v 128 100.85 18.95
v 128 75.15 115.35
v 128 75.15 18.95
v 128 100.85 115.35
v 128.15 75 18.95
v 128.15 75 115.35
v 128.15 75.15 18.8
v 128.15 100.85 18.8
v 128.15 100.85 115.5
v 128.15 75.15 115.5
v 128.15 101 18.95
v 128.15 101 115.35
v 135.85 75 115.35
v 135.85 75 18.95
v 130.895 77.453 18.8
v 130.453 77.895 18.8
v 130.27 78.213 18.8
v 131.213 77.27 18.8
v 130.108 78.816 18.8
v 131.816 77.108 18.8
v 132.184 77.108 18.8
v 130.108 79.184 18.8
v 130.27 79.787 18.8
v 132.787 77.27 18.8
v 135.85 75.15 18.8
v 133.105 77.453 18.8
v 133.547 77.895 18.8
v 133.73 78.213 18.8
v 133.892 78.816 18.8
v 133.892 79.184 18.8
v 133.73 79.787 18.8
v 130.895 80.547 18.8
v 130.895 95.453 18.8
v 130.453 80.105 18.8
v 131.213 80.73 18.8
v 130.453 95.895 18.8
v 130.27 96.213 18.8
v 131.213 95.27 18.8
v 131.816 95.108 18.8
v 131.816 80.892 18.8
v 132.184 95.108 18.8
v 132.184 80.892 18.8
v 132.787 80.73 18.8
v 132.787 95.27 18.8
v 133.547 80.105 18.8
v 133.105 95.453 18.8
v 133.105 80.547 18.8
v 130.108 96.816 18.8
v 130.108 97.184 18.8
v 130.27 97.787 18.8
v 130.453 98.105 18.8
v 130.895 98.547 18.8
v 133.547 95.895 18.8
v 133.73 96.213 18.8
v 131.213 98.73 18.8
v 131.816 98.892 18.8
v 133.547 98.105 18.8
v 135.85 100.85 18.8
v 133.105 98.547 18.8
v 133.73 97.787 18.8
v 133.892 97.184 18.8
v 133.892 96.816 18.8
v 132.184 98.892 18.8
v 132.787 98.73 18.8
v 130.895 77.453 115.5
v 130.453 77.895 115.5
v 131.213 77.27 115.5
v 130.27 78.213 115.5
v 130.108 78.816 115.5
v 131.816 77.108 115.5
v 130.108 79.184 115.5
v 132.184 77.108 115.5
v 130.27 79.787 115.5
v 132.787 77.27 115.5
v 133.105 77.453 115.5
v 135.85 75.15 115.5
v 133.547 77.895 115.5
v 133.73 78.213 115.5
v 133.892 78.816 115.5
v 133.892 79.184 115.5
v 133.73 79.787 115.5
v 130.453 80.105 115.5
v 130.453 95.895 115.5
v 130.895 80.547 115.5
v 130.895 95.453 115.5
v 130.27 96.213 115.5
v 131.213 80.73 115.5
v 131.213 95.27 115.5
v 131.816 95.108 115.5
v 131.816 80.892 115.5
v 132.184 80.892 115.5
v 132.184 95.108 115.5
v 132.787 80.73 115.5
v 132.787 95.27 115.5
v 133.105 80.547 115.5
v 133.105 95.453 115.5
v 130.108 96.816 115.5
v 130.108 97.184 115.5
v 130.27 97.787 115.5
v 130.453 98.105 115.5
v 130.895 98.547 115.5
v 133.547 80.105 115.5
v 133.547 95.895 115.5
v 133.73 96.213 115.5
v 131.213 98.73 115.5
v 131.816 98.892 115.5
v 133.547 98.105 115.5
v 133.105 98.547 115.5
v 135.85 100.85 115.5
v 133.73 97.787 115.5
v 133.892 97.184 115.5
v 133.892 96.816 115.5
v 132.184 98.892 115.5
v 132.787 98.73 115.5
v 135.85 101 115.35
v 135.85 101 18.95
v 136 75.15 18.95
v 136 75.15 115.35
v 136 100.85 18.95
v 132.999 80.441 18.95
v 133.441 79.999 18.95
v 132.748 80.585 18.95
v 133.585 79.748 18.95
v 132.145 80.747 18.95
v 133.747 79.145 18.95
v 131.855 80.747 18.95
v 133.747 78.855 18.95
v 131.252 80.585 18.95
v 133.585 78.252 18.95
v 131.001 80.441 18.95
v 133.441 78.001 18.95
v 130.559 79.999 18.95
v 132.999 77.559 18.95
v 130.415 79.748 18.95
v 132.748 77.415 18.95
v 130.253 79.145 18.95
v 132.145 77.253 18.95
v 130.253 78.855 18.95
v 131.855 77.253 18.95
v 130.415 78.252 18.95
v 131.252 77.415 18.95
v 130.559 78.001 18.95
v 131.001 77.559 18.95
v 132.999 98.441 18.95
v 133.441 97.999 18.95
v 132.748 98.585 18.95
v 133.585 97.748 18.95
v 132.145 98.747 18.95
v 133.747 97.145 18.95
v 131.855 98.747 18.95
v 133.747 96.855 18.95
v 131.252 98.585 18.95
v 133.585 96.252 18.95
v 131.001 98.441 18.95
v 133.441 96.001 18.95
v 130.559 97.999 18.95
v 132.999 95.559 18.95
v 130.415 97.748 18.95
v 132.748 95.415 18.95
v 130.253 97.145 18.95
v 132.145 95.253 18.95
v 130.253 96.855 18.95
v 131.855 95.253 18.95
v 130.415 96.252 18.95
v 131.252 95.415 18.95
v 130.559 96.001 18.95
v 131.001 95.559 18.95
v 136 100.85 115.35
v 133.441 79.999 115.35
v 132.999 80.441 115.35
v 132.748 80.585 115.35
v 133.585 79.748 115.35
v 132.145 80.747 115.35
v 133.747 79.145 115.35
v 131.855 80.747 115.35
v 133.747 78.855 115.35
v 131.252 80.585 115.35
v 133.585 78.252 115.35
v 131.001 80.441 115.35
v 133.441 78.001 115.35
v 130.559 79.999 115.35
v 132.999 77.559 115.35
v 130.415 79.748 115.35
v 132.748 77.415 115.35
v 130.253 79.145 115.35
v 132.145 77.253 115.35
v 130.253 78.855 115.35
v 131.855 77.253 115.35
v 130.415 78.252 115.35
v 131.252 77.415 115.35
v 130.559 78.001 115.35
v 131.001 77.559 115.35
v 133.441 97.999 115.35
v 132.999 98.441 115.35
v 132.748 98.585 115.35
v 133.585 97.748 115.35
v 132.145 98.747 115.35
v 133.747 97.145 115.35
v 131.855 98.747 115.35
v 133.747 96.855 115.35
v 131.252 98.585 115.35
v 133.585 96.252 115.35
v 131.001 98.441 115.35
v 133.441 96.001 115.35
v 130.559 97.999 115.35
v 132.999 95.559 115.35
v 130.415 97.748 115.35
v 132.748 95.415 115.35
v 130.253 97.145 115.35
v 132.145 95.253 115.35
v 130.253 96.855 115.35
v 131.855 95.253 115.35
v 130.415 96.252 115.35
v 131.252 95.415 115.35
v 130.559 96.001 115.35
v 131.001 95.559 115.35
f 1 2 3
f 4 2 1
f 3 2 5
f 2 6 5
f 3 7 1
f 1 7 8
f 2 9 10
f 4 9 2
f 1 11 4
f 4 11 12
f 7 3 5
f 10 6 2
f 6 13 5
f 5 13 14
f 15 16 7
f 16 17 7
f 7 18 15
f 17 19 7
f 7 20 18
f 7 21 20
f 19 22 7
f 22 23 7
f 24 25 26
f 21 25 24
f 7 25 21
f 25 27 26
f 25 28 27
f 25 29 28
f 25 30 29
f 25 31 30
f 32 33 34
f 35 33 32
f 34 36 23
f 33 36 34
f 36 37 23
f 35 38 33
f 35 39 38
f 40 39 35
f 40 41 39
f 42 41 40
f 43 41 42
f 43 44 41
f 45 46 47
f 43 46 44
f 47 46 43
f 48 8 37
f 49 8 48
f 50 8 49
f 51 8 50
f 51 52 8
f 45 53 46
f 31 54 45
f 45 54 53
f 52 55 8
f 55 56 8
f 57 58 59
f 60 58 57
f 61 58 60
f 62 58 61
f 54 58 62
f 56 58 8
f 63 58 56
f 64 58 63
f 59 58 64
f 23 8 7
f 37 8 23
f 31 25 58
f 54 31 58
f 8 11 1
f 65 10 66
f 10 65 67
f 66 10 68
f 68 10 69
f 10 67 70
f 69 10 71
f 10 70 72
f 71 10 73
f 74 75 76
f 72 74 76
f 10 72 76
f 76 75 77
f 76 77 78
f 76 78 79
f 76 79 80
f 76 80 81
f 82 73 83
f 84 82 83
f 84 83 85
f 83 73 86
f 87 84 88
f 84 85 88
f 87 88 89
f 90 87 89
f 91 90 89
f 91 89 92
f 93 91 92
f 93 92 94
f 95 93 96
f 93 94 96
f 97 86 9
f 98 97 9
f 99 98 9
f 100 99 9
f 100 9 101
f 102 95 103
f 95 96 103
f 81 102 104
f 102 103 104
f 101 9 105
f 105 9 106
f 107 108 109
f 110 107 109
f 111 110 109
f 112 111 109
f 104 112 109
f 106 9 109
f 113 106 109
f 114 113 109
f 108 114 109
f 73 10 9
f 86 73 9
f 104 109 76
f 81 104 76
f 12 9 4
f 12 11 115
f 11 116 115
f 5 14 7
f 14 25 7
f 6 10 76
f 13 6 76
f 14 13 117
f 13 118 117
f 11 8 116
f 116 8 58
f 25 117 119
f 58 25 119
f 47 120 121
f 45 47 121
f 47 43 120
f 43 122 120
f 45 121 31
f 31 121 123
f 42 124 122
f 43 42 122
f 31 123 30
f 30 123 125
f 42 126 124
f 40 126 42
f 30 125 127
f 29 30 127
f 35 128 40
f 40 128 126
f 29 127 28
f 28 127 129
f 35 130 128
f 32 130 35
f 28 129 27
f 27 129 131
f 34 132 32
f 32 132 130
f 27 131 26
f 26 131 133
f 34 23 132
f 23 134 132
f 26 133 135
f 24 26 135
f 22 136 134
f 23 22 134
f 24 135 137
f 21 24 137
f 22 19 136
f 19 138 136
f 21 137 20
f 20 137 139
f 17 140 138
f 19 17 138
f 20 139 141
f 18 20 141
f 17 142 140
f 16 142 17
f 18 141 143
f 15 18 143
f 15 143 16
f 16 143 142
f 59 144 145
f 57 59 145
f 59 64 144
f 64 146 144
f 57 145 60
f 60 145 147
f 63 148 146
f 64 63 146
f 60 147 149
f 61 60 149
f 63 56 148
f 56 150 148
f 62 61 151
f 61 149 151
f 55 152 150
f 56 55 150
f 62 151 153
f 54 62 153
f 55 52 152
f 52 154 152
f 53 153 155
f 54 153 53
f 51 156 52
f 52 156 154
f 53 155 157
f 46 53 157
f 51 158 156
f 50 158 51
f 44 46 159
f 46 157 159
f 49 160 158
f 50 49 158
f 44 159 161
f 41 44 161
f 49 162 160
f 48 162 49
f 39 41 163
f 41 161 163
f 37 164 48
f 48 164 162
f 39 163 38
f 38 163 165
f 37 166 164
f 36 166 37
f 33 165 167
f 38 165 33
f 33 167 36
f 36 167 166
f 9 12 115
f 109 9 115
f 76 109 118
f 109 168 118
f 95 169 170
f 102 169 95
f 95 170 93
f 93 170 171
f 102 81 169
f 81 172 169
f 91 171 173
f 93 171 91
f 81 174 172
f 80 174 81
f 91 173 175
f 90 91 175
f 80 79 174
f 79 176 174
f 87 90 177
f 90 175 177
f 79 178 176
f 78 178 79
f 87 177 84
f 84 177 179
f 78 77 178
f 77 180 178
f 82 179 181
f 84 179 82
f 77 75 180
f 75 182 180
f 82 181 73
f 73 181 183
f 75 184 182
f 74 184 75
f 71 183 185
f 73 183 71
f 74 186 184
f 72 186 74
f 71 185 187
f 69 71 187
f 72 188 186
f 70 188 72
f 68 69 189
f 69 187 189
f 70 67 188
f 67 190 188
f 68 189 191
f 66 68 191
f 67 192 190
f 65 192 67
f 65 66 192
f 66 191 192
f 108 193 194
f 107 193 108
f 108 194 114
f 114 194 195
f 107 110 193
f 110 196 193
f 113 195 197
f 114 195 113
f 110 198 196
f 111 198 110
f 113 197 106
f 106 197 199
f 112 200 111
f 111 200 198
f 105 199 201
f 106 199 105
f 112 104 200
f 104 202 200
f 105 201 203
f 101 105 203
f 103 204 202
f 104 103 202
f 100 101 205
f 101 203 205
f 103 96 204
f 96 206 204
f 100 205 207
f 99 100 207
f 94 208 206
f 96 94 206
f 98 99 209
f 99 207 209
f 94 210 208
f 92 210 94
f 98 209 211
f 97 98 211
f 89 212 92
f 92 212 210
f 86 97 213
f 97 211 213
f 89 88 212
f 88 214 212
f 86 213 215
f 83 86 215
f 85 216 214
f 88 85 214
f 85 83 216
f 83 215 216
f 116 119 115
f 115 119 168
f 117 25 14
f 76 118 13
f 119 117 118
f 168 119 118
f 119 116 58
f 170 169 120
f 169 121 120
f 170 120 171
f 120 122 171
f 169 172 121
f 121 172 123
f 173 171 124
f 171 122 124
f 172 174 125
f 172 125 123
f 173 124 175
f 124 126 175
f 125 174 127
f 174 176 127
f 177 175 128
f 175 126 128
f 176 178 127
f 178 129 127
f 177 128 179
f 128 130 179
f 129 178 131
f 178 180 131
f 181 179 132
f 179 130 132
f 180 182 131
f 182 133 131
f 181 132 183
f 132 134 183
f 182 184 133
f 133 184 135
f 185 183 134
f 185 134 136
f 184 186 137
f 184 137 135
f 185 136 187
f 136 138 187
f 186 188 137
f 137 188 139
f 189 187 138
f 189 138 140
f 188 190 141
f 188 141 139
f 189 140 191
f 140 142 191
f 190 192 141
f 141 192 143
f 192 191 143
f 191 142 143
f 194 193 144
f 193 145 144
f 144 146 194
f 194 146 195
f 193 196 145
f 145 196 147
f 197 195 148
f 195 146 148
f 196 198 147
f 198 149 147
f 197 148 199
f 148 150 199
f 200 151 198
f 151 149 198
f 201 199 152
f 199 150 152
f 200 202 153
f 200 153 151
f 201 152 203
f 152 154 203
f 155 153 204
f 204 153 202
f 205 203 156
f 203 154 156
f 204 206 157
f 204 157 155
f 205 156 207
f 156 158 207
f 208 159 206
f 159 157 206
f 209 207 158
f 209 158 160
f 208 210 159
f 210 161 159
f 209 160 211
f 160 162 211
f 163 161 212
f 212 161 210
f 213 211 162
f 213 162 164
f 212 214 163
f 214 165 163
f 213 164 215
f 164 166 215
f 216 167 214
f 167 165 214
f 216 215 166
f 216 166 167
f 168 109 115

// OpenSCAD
// Generated from the same CSG operations as STEP. Rebuild with spec/build_parent_hand_service.py.
polyhedron(points=[[128.0, 75.1500015258789, 18.950000762939453], [128.0, 75.1500015258789, 115.3499984741211], [128.0, 100.8499984741211, 18.950000762939453], [128.0, 100.8499984741211, 115.3499984741211], [128.14999389648438, 75.0, 18.950000762939453], [128.14999389648438, 75.0, 115.3499984741211], [128.14999389648438, 75.1500015258789, 18.799999237060547], [128.14999389648438, 100.8499984741211, 18.799999237060547], [128.14999389648438, 75.1500015258789, 115.5], [128.14999389648438, 100.8499984741211, 115.5], [128.14999389648438, 101.0, 18.950000762939453], [128.14999389648438, 101.0, 115.3499984741211], [135.85000610351562, 75.0, 115.3499984741211], [135.85000610351562, 75.0, 18.950000762939453], [130.4534149169922, 77.89494323730469, 18.799999237060547], [130.8949432373047, 77.45340728759766, 18.799999237060547], [130.2696990966797, 78.21314239501953, 18.799999237060547], [131.213134765625, 77.26969909667969, 18.799999237060547], [130.1080780029297, 78.81629180908203, 18.799999237060547], [131.8162841796875, 77.10808563232422, 18.799999237060547], [132.1837158203125, 77.10808563232422, 18.799999237060547], [130.1080780029297, 79.18370819091797, 18.799999237060547], [130.2696990966797, 79.78685760498047, 18.799999237060547], [133.1050567626953, 77.45340728759766, 18.799999237060547], [135.85000610351562, 75.1500015258789, 18.799999237060547], [132.786865234375, 77.26969909667969, 18.799999237060547], [133.5465850830078, 77.89494323730469, 18.799999237060547], [133.7303009033203, 78.21314239501953, 18.799999237060547], [133.8919219970703, 78.81629180908203, 18.799999237060547], [133.8919219970703, 79.18370819091797, 18.799999237060547], [133.7303009033203, 79.78685760498047, 18.799999237060547], [130.4534149169922, 80.10505676269531, 18.799999237060547], [130.8949432373047, 95.45340728759766, 18.799999237060547], [130.8949432373047, 80.54659271240234, 18.799999237060547], [131.213134765625, 80.73030090332031, 18.799999237060547], [130.4534149169922, 95.89494323730469, 18.799999237060547], [130.2696990966797, 96.21314239501953, 18.799999237060547], [131.213134765625, 95.26969909667969, 18.799999237060547], [131.8162841796875, 95.10808563232422, 18.799999237060547], [131.8162841796875, 80.89191436767578, 18.799999237060547], [132.1837158203125, 95.10808563232422, 18.799999237060547], [132.1837158203125, 80.89191436767578, 18.799999237060547], [132.786865234375, 80.73030090332031, 18.799999237060547], [132.786865234375, 95.26969909667969, 18.799999237060547], [133.1050567626953, 80.54659271240234, 18.799999237060547], [133.1050567626953, 95.45340728759766, 18.799999237060547], [133.5465850830078, 80.10505676269531, 18.799999237060547], [130.1080780029297, 96.81629180908203, 18.799999237060547], [130.1080780029297, 97.18370819091797, 18.799999237060547], [130.2696990966797, 97.78685760498047, 18.799999237060547], [130.4534149169922, 98.10505676269531, 18.799999237060547], [130.8949432373047, 98.54659271240234, 18.799999237060547], [133.5465850830078, 95.89494323730469, 18.799999237060547], [133.7303009033203, 96.21314239501953, 18.799999237060547], [131.213134765625, 98.73030090332031, 18.799999237060547], [131.8162841796875, 98.89191436767578, 18.799999237060547], [133.1050567626953, 98.54659271240234, 18.799999237060547], [135.85000610351562, 100.8499984741211, 18.799999237060547], [133.5465850830078, 98.10505676269531, 18.799999237060547], [133.7303009033203, 97.78685760498047, 18.799999237060547], [133.8919219970703, 97.18370819091797, 18.799999237060547], [133.8919219970703, 96.81629180908203, 18.799999237060547], [132.1837158203125, 98.89191436767578, 18.799999237060547], [132.786865234375, 98.73030090332031, 18.799999237060547], [130.4534149169922, 77.89494323730469, 115.5], [130.8949432373047, 77.45340728759766, 115.5], [131.213134765625, 77.26969909667969, 115.5], [130.2696990966797, 78.21314239501953, 115.5], [130.1080780029297, 78.81629180908203, 115.5], [131.8162841796875, 77.10808563232422, 115.5], [130.1080780029297, 79.18370819091797, 115.5], [132.1837158203125, 77.10808563232422, 115.5], [130.2696990966797, 79.78685760498047, 115.5], [135.85000610351562, 75.1500015258789, 115.5], [133.1050567626953, 77.45340728759766, 115.5], [132.786865234375, 77.26969909667969, 115.5], [133.5465850830078, 77.89494323730469, 115.5], [133.7303009033203, 78.21314239501953, 115.5], [133.8919219970703, 78.81629180908203, 115.5], [133.8919219970703, 79.18370819091797, 115.5], [133.7303009033203, 79.78685760498047, 115.5], [130.4534149169922, 95.89494323730469, 115.5], [130.4534149169922, 80.10505676269531, 115.5], [130.8949432373047, 80.54659271240234, 115.5], [130.8949432373047, 95.45340728759766, 115.5], [130.2696990966797, 96.21314239501953, 115.5], [131.213134765625, 95.26969909667969, 115.5], [131.213134765625, 80.73030090332031, 115.5], [131.8162841796875, 95.10808563232422, 115.5], [131.8162841796875, 80.89191436767578, 115.5], [132.1837158203125, 80.89191436767578, 115.5], [132.1837158203125, 95.10808563232422, 115.5], [132.786865234375, 80.73030090332031, 115.5], [132.786865234375, 95.26969909667969, 115.5], [133.1050567626953, 95.45340728759766, 115.5], [133.1050567626953, 80.54659271240234, 115.5], [130.1080780029297, 96.81629180908203, 115.5], [130.1080780029297, 97.18370819091797, 115.5], [130.2696990966797, 97.78685760498047, 115.5], [130.4534149169922, 98.10505676269531, 115.5], [130.8949432373047, 98.54659271240234, 115.5], [133.5465850830078, 95.89494323730469, 115.5], [133.5465850830078, 80.10505676269531, 115.5], [133.7303009033203, 96.21314239501953, 115.5], [131.213134765625, 98.73030090332031, 115.5], [131.8162841796875, 98.89191436767578, 115.5], [135.85000610351562, 100.8499984741211, 115.5], [133.1050567626953, 98.54659271240234, 115.5], [133.5465850830078, 98.10505676269531, 115.5], [133.7303009033203, 97.78685760498047, 115.5], [133.8919219970703, 97.18370819091797, 115.5], [133.8919219970703, 96.81629180908203, 115.5], [132.1837158203125, 98.89191436767578, 115.5], [132.786865234375, 98.73030090332031, 115.5], [135.85000610351562, 101.0, 115.3499984741211], [135.85000610351562, 101.0, 18.950000762939453], [136.0, 75.1500015258789, 18.950000762939453], [136.0, 75.1500015258789, 115.3499984741211], [136.0, 100.8499984741211, 18.950000762939453], [133.44052124023438, 79.99899291992188, 18.950000762939453], [132.99899291992188, 80.4405288696289, 18.950000762939453], [132.74803161621094, 80.58541870117188, 18.950000762939453], [133.58541870117188, 79.74803924560547, 18.950000762939453], [132.14488220214844, 80.74703216552734, 18.950000762939453], [133.7470245361328, 79.14488983154297, 18.950000762939453], [131.85511779785156, 80.74703216552734, 18.950000762939453], [133.7470245361328, 78.85511016845703, 18.950000762939453], [131.25196838378906, 80.58541870117188, 18.950000762939453], [133.58541870117188, 78.25196075439453, 18.950000762939453], [131.00100708007812, 80.4405288696289, 18.950000762939453], [133.44052124023438, 78.00100708007812, 18.950000762939453], [130.55947875976562, 79.99899291992188, 18.950000762939453], [132.99899291992188, 77.5594711303711, 18.950000762939453], [130.41458129882812, 79.74803924560547, 18.950000762939453], [132.74803161621094, 77.41458129882812, 18.950000762939453], [130.2529754638672, 79.14488983154297, 18.950000762939453], [132.14488220214844, 77.25296783447266, 18.950000762939453], [130.2529754638672, 78.85511016845703, 18.950000762939453], [131.85511779785156, 77.25296783447266, 18.950000762939453], [130.41458129882812, 78.25196075439453, 18.950000762939453], [131.25196838378906, 77.41458129882812, 18.950000762939453], [130.55947875976562, 78.00100708007812, 18.950000762939453], [131.00100708007812, 77.5594711303711, 18.950000762939453], [133.44052124023438, 97.99899291992188, 18.950000762939453], [132.99899291992188, 98.4405288696289, 18.950000762939453], [132.74803161621094, 98.58541870117188, 18.950000762939453], [133.58541870117188, 97.74803924560547, 18.950000762939453], [132.14488220214844, 98.74703216552734, 18.950000762939453], [133.7470245361328, 97.14488983154297, 18.950000762939453], [131.85511779785156, 98.74703216552734, 18.950000762939453], [133.7470245361328, 96.85511016845703, 18.950000762939453], [131.25196838378906, 98.58541870117188, 18.950000762939453], [133.58541870117188, 96.25196075439453, 18.950000762939453], [131.00100708007812, 98.4405288696289, 18.950000762939453], [133.44052124023438, 96.00100708007812, 18.950000762939453], [130.55947875976562, 97.99899291992188, 18.950000762939453], [132.99899291992188, 95.5594711303711, 18.950000762939453], [130.41458129882812, 97.74803924560547, 18.950000762939453], [132.74803161621094, 95.41458129882812, 18.950000762939453], [130.2529754638672, 97.14488983154297, 18.950000762939453], [132.14488220214844, 95.25296783447266, 18.950000762939453], [130.2529754638672, 96.85511016845703, 18.950000762939453], [131.85511779785156, 95.25296783447266, 18.950000762939453], [130.41458129882812, 96.25196075439453, 18.950000762939453], [131.25196838378906, 95.41458129882812, 18.950000762939453], [130.55947875976562, 96.00100708007812, 18.950000762939453], [131.00100708007812, 95.5594711303711, 18.950000762939453], [136.0, 100.8499984741211, 115.3499984741211], [132.99899291992188, 80.4405288696289, 115.3499984741211], [133.44052124023438, 79.99899291992188, 115.3499984741211], [132.74803161621094, 80.58541870117188, 115.3499984741211], [133.58541870117188, 79.74803924560547, 115.3499984741211], [132.14488220214844, 80.74703216552734, 115.3499984741211], [133.7470245361328, 79.14488983154297, 115.3499984741211], [131.85511779785156, 80.74703216552734, 115.3499984741211], [133.7470245361328, 78.85511016845703, 115.3499984741211], [131.25196838378906, 80.58541870117188, 115.3499984741211], [133.58541870117188, 78.25196075439453, 115.3499984741211], [131.00100708007812, 80.4405288696289, 115.3499984741211], [133.44052124023438, 78.00100708007812, 115.3499984741211], [130.55947875976562, 79.99899291992188, 115.3499984741211], [132.99899291992188, 77.5594711303711, 115.3499984741211], [130.41458129882812, 79.74803924560547, 115.3499984741211], [132.74803161621094, 77.41458129882812, 115.3499984741211], [130.2529754638672, 79.14488983154297, 115.3499984741211], [132.14488220214844, 77.25296783447266, 115.3499984741211], [130.2529754638672, 78.85511016845703, 115.3499984741211], [131.85511779785156, 77.25296783447266, 115.3499984741211], [130.41458129882812, 78.25196075439453, 115.3499984741211], [131.25196838378906, 77.41458129882812, 115.3499984741211], [130.55947875976562, 78.00100708007812, 115.3499984741211], [131.00100708007812, 77.5594711303711, 115.3499984741211], [132.99899291992188, 98.4405288696289, 115.3499984741211], [133.44052124023438, 97.99899291992188, 115.3499984741211], [132.74803161621094, 98.58541870117188, 115.3499984741211], [133.58541870117188, 97.74803924560547, 115.3499984741211], [132.14488220214844, 98.74703216552734, 115.3499984741211], [133.7470245361328, 97.14488983154297, 115.3499984741211], [131.85511779785156, 98.74703216552734, 115.3499984741211], [133.7470245361328, 96.85511016845703, 115.3499984741211], [131.25196838378906, 98.58541870117188, 115.3499984741211], [133.58541870117188, 96.25196075439453, 115.3499984741211], [131.00100708007812, 98.4405288696289, 115.3499984741211], [133.44052124023438, 96.00100708007812, 115.3499984741211], [130.55947875976562, 97.99899291992188, 115.3499984741211], [132.99899291992188, 95.5594711303711, 115.3499984741211], [130.41458129882812, 97.74803924560547, 115.3499984741211], [132.74803161621094, 95.41458129882812, 115.3499984741211], [130.2529754638672, 97.14488983154297, 115.3499984741211], [132.14488220214844, 95.25296783447266, 115.3499984741211], [130.2529754638672, 96.85511016845703, 115.3499984741211], [131.85511779785156, 95.25296783447266, 115.3499984741211], [130.41458129882812, 96.25196075439453, 115.3499984741211], [131.25196838378906, 95.41458129882812, 115.3499984741211], [130.55947875976562, 96.00100708007812, 115.3499984741211], [131.00100708007812, 95.5594711303711, 115.3499984741211]],faces=[[0, 1, 2], [2, 1, 3], [4, 1, 0], [4, 5, 1], [2, 6, 0], [7, 6, 2], [8, 9, 1], [1, 9, 3], [3, 10, 2], [11, 10, 3], [4, 0, 6], [1, 5, 8], [4, 12, 5], [13, 12, 4], [6, 14, 15], [6, 16, 14], [15, 17, 6], [6, 18, 16], [17, 19, 6], [19, 20, 6], [6, 21, 18], [6, 22, 21], [23, 24, 25], [25, 24, 20], [20, 24, 6], [23, 26, 24], [26, 27, 24], [27, 28, 24], [28, 29, 24], [29, 30, 24], [31, 32, 33], [33, 32, 34], [22, 35, 31], [31, 35, 32], [22, 36, 35], [32, 37, 34], [37, 38, 34], [34, 38, 39], [38, 40, 39], [39, 40, 41], [41, 40, 42], [40, 43, 42], [44, 45, 46], [43, 45, 42], [42, 45, 44], [36, 7, 47], [47, 7, 48], [48, 7, 49], [49, 7, 50], [7, 51, 50], [45, 52, 46], [46, 53, 30], [52, 53, 46], [7, 54, 51], [7, 55, 54], [56, 57, 58], [58, 57, 59], [59, 57, 60], [60, 57, 61], [61, 57, 53], [7, 57, 55], [55, 57, 62], [62, 57, 63], [63, 57, 56], [6, 7, 22], [22, 7, 36], [57, 24, 30], [57, 30, 53], [2, 10, 7], [64, 8, 65], [66, 65, 8], [67, 8, 64], [68, 8, 67], [69, 66, 8], [70, 8, 68], [71, 69, 8], [72, 8, 70], [73, 74, 75], [73, 75, 71], [73, 71, 8], [76, 74, 73], [77, 76, 73], [78, 77, 73], [79, 78, 73], [80, 79, 73], [81, 72, 82], [81, 82, 83], [84, 81, 83], [85, 72, 81], [86, 83, 87], [86, 84, 83], [88, 86, 87], [88, 87, 89], [88, 89, 90], [91, 88, 90], [91, 90, 92], [93, 91, 92], [94, 92, 95], [94, 93, 92], [9, 85, 96], [9, 96, 97], [9, 97, 98], [9, 98, 99], [100, 9, 99], [101, 95, 102], [101, 94, 95], [103, 102, 80], [103, 101, 102], [104, 9, 100], [105, 9, 104], [106, 107, 108], [106, 108, 109], [106, 109, 110], [106, 110, 111], [106, 111, 103], [106, 9, 105], [106, 105, 112], [106, 112, 113], [106, 113, 107], [9, 8, 72], [9, 72, 85], [73, 106, 103], [73, 103, 80], [3, 9, 11], [114, 10, 11], [114, 115, 10], [6, 13, 4], [6, 24, 13], [73, 8, 5], [73, 5, 12], [116, 12, 13], [116, 117, 12], [115, 7, 10], [57, 7, 115], [118, 116, 24], [118, 24, 57], [119, 120, 44], [119, 44, 46], [120, 42, 44], [120, 121, 42], [30, 119, 46], [122, 119, 30], [121, 123, 41], [121, 41, 42], [29, 122, 30], [124, 122, 29], [123, 125, 41], [41, 125, 39], [126, 124, 29], [126, 29, 28], [39, 127, 34], [125, 127, 39], [27, 126, 28], [128, 126, 27], [127, 129, 34], [34, 129, 33], [26, 128, 27], [130, 128, 26], [33, 131, 31], [129, 131, 33], [23, 130, 26], [132, 130, 23], [131, 22, 31], [131, 133, 22], [134, 132, 23], [134, 23, 25], [133, 135, 21], [133, 21, 22], [136, 134, 25], [136, 25, 20], [135, 18, 21], [135, 137, 18], [19, 136, 20], [138, 136, 19], [137, 139, 16], [137, 16, 18], [140, 138, 19], [140, 19, 17], [139, 141, 16], [16, 141, 14], [142, 140, 17], [142, 17, 15], [14, 142, 15], [141, 142, 14], [143, 144, 56], [143, 56, 58], [144, 63, 56], [144, 145, 63], [59, 143, 58], [146, 143, 59], [145, 147, 62], [145, 62, 63], [148, 146, 59], [148, 59, 60], [147, 55, 62], [147, 149, 55], [150, 60, 61], [150, 148, 60], [149, 151, 54], [149, 54, 55], [152, 150, 61], [152, 61, 53], [151, 51, 54], [151, 153, 51], [154, 152, 52], [52, 152, 53], [51, 155, 50], [153, 155, 51], [156, 154, 52], [156, 52, 45], [155, 157, 50], [50, 157, 49], [158, 45, 43], [158, 156, 45], [157, 159, 48], [157, 48, 49], [160, 158, 43], [160, 43, 40], [159, 161, 48], [48, 161, 47], [162, 40, 38], [162, 160, 40], [47, 163, 36], [161, 163, 47], [37, 162, 38], [164, 162, 37], [163, 165, 36], [36, 165, 35], [166, 164, 32], [32, 164, 37], [35, 166, 32], [165, 166, 35], [114, 11, 9], [114, 9, 106], [117, 106, 73], [117, 167, 106], [168, 169, 95], [95, 169, 102], [92, 168, 95], [170, 168, 92], [169, 80, 102], [169, 171, 80], [172, 170, 90], [90, 170, 92], [171, 173, 80], [80, 173, 79], [174, 172, 90], [174, 90, 89], [173, 78, 79], [173, 175, 78], [176, 89, 87], [176, 174, 89], [175, 177, 78], [78, 177, 77], [83, 176, 87], [178, 176, 83], [177, 76, 77], [177, 179, 76], [180, 178, 82], [82, 178, 83], [179, 74, 76], [179, 181, 74], [72, 180, 82], [182, 180, 72], [181, 183, 74], [74, 183, 75], [184, 182, 70], [70, 182, 72], [183, 185, 75], [75, 185, 71], [186, 184, 70], [186, 70, 68], [185, 187, 71], [71, 187, 69], [188, 68, 67], [188, 186, 68], [187, 66, 69], [187, 189, 66], [190, 188, 67], [190, 67, 64], [189, 191, 66], [66, 191, 65], [191, 64, 65], [191, 190, 64], [192, 193, 107], [107, 193, 108], [113, 192, 107], [194, 192, 113], [193, 109, 108], [193, 195, 109], [196, 194, 112], [112, 194, 113], [195, 197, 109], [109, 197, 110], [105, 196, 112], [198, 196, 105], [110, 199, 111], [197, 199, 110], [200, 198, 104], [104, 198, 105], [199, 103, 111], [199, 201, 103], [202, 200, 104], [202, 104, 100], [201, 203, 101], [201, 101, 103], [204, 100, 99], [204, 202, 100], [203, 94, 101], [203, 205, 94], [206, 204, 99], [206, 99, 98], [205, 207, 93], [205, 93, 94], [208, 98, 97], [208, 206, 98], [207, 209, 93], [93, 209, 91], [210, 208, 97], [210, 97, 96], [91, 211, 88], [209, 211, 91], [212, 96, 85], [212, 210, 96], [211, 86, 88], [211, 213, 86], [214, 212, 85], [214, 85, 81], [213, 215, 84], [213, 84, 86], [215, 81, 84], [215, 214, 81], [114, 118, 115], [167, 118, 114], [13, 24, 116], [12, 117, 73], [117, 116, 118], [117, 118, 167], [57, 115, 118], [120, 169, 168], [120, 119, 169], [170, 120, 168], [170, 121, 120], [119, 171, 169], [122, 171, 119], [123, 170, 172], [123, 121, 170], [124, 173, 171], [122, 124, 171], [174, 123, 172], [174, 125, 123], [126, 173, 124], [126, 175, 173], [127, 174, 176], [127, 125, 174], [126, 177, 175], [126, 128, 177], [178, 127, 176], [178, 129, 127], [130, 177, 128], [130, 179, 177], [131, 178, 180], [131, 129, 178], [130, 181, 179], [130, 132, 181], [182, 131, 180], [182, 133, 131], [132, 183, 181], [134, 183, 132], [133, 182, 184], [135, 133, 184], [136, 185, 183], [134, 136, 183], [186, 135, 184], [186, 137, 135], [136, 187, 185], [138, 187, 136], [137, 186, 188], [139, 137, 188], [140, 189, 187], [138, 140, 187], [190, 139, 188], [190, 141, 139], [140, 191, 189], [142, 191, 140], [142, 190, 191], [142, 141, 190], [144, 193, 192], [144, 143, 193], [192, 145, 144], [194, 145, 192], [143, 195, 193], [146, 195, 143], [147, 194, 196], [147, 145, 194], [146, 197, 195], [146, 148, 197], [198, 147, 196], [198, 149, 147], [197, 150, 199], [197, 148, 150], [151, 198, 200], [151, 149, 198], [152, 201, 199], [150, 152, 199], [202, 151, 200], [202, 153, 151], [203, 152, 154], [201, 152, 203], [155, 202, 204], [155, 153, 202], [156, 205, 203], [154, 156, 203], [206, 155, 204], [206, 157, 155], [205, 158, 207], [205, 156, 158], [157, 206, 208], [159, 157, 208], [158, 209, 207], [158, 160, 209], [210, 159, 208], [210, 161, 159], [211, 160, 162], [209, 160, 211], [161, 210, 212], [163, 161, 212], [162, 213, 211], [162, 164, 213], [214, 163, 212], [214, 165, 163], [213, 166, 215], [213, 164, 166], [165, 214, 215], [166, 165, 215], [114, 106, 167]],convexity=10);
